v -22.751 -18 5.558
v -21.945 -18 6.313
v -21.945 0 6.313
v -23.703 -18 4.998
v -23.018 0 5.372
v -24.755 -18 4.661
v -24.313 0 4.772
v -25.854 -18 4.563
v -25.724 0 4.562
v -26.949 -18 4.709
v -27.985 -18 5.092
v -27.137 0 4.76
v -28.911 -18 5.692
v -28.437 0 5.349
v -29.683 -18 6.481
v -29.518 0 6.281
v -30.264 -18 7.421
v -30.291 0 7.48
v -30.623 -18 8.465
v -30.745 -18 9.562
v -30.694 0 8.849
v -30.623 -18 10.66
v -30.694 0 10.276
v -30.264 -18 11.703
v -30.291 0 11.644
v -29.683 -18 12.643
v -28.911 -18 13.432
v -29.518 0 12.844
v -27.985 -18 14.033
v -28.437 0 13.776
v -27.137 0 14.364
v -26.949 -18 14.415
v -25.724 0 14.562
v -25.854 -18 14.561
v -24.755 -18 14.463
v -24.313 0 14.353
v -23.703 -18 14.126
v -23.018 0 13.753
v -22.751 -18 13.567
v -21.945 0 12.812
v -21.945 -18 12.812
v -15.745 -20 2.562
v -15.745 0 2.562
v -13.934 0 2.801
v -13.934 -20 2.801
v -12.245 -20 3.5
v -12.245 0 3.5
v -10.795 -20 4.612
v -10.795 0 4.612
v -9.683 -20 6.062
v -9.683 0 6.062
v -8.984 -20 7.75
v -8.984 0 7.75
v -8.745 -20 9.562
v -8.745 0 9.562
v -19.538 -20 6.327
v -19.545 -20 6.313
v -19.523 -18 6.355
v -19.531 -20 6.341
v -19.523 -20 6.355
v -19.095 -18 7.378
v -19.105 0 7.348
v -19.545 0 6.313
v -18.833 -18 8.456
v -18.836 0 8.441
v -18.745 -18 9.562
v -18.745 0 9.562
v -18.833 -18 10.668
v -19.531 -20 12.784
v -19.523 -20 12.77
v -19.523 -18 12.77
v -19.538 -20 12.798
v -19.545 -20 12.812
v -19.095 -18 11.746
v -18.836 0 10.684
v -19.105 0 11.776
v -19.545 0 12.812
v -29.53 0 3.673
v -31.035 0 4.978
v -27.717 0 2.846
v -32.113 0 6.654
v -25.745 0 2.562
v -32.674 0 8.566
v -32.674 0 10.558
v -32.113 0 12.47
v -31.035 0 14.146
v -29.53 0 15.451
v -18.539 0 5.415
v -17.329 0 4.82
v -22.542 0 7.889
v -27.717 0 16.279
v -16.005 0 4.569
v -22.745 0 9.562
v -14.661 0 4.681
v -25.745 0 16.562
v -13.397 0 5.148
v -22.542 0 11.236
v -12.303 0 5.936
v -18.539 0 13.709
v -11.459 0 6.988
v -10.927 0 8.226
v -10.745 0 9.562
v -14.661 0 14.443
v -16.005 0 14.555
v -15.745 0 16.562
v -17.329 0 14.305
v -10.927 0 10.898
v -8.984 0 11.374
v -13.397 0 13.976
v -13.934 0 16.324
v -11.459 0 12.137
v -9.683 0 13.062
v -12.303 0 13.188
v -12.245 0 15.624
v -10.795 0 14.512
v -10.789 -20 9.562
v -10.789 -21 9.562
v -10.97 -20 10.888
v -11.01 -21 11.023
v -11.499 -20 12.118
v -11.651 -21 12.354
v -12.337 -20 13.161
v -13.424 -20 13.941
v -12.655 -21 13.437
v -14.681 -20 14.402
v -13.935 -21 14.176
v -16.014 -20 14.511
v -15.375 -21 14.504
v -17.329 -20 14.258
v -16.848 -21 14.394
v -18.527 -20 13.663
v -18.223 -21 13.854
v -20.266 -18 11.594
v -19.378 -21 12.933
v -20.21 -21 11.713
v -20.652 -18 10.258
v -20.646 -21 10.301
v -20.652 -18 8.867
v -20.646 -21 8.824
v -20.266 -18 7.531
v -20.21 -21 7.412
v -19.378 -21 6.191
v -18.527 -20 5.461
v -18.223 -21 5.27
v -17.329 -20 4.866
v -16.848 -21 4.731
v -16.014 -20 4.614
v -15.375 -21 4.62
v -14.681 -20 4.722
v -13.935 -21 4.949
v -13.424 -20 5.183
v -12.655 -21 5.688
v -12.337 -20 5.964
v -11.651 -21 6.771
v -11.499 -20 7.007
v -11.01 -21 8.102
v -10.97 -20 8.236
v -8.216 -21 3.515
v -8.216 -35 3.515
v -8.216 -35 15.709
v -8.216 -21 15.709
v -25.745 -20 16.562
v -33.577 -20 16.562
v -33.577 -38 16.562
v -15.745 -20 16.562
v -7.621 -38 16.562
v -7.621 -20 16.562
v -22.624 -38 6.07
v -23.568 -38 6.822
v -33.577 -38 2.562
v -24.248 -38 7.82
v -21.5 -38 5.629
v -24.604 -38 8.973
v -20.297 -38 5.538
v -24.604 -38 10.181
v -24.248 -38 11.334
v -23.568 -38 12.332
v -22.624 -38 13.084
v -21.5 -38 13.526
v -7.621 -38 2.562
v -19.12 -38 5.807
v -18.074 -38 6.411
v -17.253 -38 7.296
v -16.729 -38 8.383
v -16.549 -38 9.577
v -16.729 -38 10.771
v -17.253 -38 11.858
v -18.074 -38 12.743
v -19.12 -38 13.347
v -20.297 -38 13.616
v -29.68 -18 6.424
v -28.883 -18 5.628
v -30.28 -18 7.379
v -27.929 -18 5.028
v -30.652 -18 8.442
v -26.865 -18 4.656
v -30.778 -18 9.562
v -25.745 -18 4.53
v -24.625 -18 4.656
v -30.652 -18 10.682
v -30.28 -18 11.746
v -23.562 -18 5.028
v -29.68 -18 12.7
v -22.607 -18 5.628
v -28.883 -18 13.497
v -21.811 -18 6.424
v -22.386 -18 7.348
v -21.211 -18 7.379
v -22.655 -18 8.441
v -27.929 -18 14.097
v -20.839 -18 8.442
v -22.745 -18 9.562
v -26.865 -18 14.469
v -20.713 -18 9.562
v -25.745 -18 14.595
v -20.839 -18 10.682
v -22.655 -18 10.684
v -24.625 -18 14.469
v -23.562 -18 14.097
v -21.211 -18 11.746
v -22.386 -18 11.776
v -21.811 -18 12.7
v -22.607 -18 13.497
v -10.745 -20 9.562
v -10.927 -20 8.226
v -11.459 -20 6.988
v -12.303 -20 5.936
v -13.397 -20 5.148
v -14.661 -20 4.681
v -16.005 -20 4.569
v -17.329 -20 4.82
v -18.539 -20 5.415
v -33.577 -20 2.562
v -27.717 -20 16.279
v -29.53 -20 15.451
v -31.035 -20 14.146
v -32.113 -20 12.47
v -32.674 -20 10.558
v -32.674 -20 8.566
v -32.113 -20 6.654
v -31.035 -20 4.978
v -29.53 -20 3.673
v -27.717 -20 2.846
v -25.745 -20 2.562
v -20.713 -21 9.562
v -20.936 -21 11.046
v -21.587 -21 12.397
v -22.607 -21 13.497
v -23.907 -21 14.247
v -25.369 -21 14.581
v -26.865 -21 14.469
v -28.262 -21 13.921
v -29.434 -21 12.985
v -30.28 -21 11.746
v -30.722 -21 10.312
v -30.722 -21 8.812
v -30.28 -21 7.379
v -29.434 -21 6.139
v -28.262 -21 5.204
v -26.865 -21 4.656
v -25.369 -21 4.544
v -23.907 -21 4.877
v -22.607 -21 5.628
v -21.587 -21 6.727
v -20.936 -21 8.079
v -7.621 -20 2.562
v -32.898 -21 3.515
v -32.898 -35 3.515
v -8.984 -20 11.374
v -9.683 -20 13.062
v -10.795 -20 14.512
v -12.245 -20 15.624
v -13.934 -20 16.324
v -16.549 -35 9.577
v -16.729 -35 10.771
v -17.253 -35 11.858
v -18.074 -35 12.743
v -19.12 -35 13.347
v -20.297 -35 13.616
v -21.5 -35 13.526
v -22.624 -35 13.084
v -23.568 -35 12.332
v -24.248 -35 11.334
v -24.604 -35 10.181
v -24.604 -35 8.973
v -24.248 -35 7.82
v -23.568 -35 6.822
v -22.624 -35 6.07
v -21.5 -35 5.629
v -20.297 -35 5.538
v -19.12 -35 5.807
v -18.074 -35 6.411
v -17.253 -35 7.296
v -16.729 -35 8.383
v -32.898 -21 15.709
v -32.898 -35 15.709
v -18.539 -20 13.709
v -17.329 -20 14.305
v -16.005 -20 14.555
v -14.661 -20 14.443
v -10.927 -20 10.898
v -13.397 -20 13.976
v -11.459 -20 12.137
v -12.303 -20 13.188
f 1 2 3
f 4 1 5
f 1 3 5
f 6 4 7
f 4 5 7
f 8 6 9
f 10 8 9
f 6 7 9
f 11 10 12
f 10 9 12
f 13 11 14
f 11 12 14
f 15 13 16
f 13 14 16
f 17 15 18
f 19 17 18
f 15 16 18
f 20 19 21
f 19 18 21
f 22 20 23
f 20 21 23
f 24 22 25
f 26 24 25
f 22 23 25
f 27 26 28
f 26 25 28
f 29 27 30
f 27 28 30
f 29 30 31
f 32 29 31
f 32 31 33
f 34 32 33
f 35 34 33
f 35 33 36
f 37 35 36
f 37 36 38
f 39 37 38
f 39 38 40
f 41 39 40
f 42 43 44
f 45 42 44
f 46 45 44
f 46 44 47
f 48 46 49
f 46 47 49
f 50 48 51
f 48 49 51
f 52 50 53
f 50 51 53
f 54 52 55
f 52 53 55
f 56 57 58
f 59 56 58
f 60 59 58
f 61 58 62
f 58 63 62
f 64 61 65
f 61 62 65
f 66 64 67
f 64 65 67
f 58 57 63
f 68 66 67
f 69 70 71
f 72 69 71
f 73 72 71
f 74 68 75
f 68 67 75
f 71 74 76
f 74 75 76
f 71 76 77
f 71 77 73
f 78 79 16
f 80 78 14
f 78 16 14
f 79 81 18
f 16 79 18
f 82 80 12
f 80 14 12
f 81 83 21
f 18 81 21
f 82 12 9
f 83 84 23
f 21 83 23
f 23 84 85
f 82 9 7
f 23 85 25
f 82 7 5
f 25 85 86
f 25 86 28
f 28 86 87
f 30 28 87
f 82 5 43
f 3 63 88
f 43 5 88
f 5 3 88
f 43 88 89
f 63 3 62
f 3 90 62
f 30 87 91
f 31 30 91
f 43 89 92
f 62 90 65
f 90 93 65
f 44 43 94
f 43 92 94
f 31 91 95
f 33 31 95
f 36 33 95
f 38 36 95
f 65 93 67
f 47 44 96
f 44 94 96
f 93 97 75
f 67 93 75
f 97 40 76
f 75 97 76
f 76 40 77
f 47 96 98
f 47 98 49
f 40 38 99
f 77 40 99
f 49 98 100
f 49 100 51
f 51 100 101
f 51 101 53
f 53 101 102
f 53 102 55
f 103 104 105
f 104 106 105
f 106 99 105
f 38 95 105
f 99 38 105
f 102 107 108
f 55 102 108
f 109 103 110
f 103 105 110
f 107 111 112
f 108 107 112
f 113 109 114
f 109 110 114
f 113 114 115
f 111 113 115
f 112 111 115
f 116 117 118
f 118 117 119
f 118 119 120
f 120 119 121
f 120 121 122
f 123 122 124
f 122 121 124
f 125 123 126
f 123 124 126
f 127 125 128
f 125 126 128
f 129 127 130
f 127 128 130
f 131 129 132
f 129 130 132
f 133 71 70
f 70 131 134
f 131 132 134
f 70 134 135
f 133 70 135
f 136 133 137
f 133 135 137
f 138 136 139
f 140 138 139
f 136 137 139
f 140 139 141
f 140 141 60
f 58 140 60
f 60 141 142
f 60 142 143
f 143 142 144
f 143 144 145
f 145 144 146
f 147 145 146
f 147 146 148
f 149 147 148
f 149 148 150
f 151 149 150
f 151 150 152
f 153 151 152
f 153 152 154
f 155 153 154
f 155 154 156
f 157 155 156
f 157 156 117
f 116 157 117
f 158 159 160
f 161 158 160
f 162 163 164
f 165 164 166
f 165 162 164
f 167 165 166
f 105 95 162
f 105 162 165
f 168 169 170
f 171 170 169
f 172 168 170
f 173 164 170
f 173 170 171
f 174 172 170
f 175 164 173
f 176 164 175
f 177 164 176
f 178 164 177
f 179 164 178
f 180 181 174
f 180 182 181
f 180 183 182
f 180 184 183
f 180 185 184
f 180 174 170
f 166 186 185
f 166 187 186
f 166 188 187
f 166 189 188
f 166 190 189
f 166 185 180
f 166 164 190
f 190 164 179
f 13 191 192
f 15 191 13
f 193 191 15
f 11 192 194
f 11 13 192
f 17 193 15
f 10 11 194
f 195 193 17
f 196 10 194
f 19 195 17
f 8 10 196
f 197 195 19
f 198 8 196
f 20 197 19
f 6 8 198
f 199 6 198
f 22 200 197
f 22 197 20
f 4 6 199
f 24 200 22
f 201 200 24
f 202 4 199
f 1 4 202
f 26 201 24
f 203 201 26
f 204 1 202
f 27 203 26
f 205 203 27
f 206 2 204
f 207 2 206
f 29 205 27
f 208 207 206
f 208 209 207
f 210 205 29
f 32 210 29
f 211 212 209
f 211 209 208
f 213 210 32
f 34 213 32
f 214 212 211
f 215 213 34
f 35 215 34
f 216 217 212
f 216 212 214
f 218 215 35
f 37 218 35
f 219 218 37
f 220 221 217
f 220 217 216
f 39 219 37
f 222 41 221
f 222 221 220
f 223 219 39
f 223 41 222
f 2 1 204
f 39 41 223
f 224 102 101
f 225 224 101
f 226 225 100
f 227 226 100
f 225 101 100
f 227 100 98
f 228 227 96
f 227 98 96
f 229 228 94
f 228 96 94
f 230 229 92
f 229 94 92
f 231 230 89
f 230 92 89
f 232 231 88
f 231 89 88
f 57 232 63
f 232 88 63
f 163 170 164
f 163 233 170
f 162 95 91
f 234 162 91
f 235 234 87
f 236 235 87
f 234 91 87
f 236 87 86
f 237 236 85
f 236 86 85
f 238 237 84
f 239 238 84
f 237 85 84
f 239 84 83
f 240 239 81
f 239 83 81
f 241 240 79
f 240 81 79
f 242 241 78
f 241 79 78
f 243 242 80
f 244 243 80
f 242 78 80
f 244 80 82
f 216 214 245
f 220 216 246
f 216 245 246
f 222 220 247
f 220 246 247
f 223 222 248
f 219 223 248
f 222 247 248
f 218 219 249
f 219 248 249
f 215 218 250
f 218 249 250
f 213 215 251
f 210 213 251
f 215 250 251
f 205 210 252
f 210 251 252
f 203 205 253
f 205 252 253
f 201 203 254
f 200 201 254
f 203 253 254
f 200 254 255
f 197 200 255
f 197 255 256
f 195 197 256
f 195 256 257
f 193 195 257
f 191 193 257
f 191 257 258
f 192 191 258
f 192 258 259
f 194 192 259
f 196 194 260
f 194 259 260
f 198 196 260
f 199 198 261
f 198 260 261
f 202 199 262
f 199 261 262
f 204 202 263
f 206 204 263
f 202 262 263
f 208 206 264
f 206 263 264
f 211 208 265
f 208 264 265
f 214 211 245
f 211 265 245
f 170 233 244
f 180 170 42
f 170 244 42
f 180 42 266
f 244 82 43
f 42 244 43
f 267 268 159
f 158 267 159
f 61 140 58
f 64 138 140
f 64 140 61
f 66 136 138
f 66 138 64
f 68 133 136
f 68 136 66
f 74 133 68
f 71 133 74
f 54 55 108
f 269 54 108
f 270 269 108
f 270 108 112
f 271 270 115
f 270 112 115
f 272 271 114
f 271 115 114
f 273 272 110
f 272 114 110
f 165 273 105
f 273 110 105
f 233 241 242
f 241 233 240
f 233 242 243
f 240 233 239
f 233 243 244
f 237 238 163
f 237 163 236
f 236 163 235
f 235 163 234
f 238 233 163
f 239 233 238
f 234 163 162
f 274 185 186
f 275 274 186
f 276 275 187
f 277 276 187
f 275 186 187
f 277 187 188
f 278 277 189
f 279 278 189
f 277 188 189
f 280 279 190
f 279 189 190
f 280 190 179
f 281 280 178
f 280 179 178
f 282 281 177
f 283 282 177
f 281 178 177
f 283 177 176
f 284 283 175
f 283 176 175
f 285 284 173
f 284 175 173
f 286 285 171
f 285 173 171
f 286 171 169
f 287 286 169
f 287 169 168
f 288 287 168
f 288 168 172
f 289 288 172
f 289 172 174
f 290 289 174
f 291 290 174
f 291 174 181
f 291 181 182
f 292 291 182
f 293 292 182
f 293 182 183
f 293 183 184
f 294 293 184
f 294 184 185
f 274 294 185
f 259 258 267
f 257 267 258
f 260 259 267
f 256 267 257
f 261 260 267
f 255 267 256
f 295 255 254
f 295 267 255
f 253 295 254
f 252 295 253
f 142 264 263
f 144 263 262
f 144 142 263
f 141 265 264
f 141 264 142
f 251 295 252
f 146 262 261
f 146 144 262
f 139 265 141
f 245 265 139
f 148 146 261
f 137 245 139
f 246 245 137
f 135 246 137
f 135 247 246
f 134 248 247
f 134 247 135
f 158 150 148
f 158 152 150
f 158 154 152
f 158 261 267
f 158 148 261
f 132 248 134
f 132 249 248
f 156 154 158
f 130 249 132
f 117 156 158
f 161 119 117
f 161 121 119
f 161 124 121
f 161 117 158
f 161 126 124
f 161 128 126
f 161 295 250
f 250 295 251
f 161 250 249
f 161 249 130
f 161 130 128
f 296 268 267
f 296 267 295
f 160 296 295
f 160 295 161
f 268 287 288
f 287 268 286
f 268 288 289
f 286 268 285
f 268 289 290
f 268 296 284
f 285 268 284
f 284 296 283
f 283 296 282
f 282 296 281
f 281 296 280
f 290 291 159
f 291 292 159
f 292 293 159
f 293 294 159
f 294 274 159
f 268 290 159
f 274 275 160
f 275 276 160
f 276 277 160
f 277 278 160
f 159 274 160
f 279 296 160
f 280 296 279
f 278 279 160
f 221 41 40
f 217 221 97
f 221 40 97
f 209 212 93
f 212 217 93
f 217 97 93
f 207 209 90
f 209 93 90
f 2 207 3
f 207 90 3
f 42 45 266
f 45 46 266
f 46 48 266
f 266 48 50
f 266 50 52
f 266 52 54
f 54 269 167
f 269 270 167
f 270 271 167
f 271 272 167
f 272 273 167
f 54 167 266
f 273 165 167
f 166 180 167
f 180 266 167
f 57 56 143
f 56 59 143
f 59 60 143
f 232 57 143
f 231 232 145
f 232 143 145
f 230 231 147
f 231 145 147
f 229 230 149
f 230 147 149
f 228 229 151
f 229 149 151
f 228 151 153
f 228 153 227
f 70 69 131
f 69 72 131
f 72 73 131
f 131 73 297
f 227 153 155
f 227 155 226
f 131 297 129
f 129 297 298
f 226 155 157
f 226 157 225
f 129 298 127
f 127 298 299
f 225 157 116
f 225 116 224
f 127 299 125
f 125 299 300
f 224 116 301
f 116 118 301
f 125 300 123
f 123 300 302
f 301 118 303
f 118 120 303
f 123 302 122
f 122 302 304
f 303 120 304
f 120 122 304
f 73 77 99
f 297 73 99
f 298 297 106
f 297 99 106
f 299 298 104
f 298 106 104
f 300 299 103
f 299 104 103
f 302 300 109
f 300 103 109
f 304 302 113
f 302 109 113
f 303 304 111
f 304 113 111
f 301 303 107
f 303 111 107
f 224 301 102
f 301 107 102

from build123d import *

# Parameters (mm, degrees)
F1_DEPTH  = 13
F2_R      = 6.8523627272
F3_DEPTH  = 30
F4_DEPTH  = 20
F5_W      = 25.9563405998
F5_H      = 14
F6_DEPTH  = 15
F7_W      = 24.6814545244
F7_H      = 12.1941640973
F8_DEPTH  = 14
F9_R      = 5.0327145122
F9_R_2    = 4.9558235457
F10_DEPTH = 3
F11_W     = 25.9563405998
F11_H     = 14
F12_DEPTH = 3
F13_R     = 4.05
F14_DEPTH = 5


with BuildPart() as f1:
    # F0 (on Front) → F1 (new body)
    with BuildSketch(Plane.XZ):
        with BuildLine():
            ThreePointArc((-21.9452433995, 6.3125732282), (-30.7452433995, 9.5621885901), (-21.9452433995, 12.8118039519))
            ThreePointArc((-21.9452433995, 12.8118039519), (-21.4056409565, 13.6804284443), (-20.7452433995, 14.4611680756))
            ThreePointArc((-20.7452433995, 14.4611680756), (-23.0334963979, 16.0155929784), (-25.7452433995, 16.5621885901))
            ThreePointArc((-25.7452433995, 16.5621885901), (-32.7452433995, 9.5621885901), (-25.7452433995, 2.5621885901))
            ThreePointArc((-25.7452433995, 2.5621885901), (-23.0334963979, 3.1087842017), (-20.7452433995, 4.6632091045))
            ThreePointArc((-20.7452433995, 4.6632091045), (-21.4056409565, 5.4439487359), (-21.9452433995, 6.3125732282))
        make_face()
        with BuildLine():
            ThreePointArc((-20.7452433995, 14.4611680756), (-20.0848458425, 13.6804284443), (-19.5452433995, 12.8118039519))
            ThreePointArc((-19.5452433995, 12.8118039519), (-14.0131925919, 14.2526043499), (-10.7452433995, 9.5621885901))
            ThreePointArc((-10.7452433995, 9.5621885901), (-14.0131925919, 4.8717728303), (-19.5452433995, 6.3125732282))
            ThreePointArc((-19.5452433995, 6.3125732282), (-20.0848458425, 5.4439487359), (-20.7452433995, 4.6632091045))
            ThreePointArc((-20.7452433995, 4.6632091045), (-18.4569904011, 3.1087842017), (-15.7452433995, 2.5621885901))
            ThreePointArc((-15.7452433995, 2.5621885901), (-10.7954959312, 4.6124411218), (-8.7452433995, 9.5621885901))
            ThreePointArc((-8.7452433995, 9.5621885901), (-10.7954959312, 14.5119360584), (-15.7452433995, 16.5621885901))
            ThreePointArc((-15.7452433995, 16.5621885901), (-18.4569904011, 16.0155929784), (-20.7452433995, 14.4611680756))
        make_face()
        with BuildLine():
            ThreePointArc((-25.7452433995, 16.5621885901), (-23.0334963979, 16.0155929784), (-20.7452433995, 14.4611680756))
            ThreePointArc((-20.7452433995, 14.4611680756), (-18.4569904011, 16.0155929784), (-15.7452433995, 16.5621885901))
            Line((-15.7452433995, 16.5621885901), (-25.7452433995, 16.5621885901))
        make_face()
        with BuildLine():
            ThreePointArc((-15.7452433995, 2.5621885901), (-18.4569904011, 3.1087842017), (-20.7452433995, 4.6632091045))
            ThreePointArc((-20.7452433995, 4.6632091045), (-23.0334963979, 3.1087842017), (-25.7452433995, 2.5621885901))
            Line((-25.7452433995, 2.5621885901), (-15.7452433995, 2.5621885901))
        make_face()
    extrude(amount=F1_DEPTH)

    # F2 (on face) → F3 (cut)
    with BuildSketch(Plane.XZ.offset(13)):
        with Locations((-20.7452433995, 9.5621885901)):
            Circle(F2_R)
    extrude(amount=-F3_DEPTH, mode=Mode.SUBTRACT)

    # F0 (on Front) → F4 (join)
    with BuildSketch(Plane.XZ):
        with BuildLine():
            ThreePointArc((-21.9452433995, 6.3125732282), (-21.0548276397, 7.8301377825), (-20.7452433995, 9.5621885901))
            ThreePointArc((-20.7452433995, 9.5621885901), (-21.0548276397, 11.2942393976), (-21.9452433995, 12.8118039519))
            ThreePointArc((-21.9452433995, 12.8118039519), (-22.7452433995, 9.5621885901), (-21.9452433995, 6.3125732282))
        make_face()
        with BuildLine():
            ThreePointArc((-19.5452433995, 6.3125732282), (-20.4356591593, 7.8301377825), (-20.7452433995, 9.5621885901))
            ThreePointArc((-20.7452433995, 9.5621885901), (-21.0548276397, 7.8301377825), (-21.9452433995, 6.3125732282))
            ThreePointArc((-21.9452433995, 6.3125732282), (-21.4056409565, 5.4439487359), (-20.7452433995, 4.6632091045))
            ThreePointArc((-20.7452433995, 4.6632091045), (-20.0848458425, 5.4439487359), (-19.5452433995, 6.3125732282))
        make_face()
        with BuildLine():
            ThreePointArc((-21.9452433995, 12.8118039519), (-21.0548276397, 11.2942393976), (-20.7452433995, 9.5621885901))
            ThreePointArc((-20.7452433995, 9.5621885901), (-20.4356591593, 11.2942393976), (-19.5452433995, 12.8118039519))
            ThreePointArc((-19.5452433995, 12.8118039519), (-20.0848458425, 13.6804284443), (-20.7452433995, 14.4611680756))
            ThreePointArc((-20.7452433995, 14.4611680756), (-21.4056409565, 13.6804284443), (-21.9452433995, 12.8118039519))
        make_face()
        with BuildLine():
            ThreePointArc((-19.5452433995, 12.8118039519), (-20.4356591593, 11.2942393976), (-20.7452433995, 9.5621885901))
            ThreePointArc((-20.7452433995, 9.5621885901), (-20.4356591593, 7.8301377825), (-19.5452433995, 6.3125732282))
            ThreePointArc((-19.5452433995, 6.3125732282), (-18.9481852123, 7.888868537), (-18.7452433995, 9.5621885901))
            ThreePointArc((-18.7452433995, 9.5621885901), (-18.9481852123, 11.2355086431), (-19.5452433995, 12.8118039519))
        make_face()
        with BuildLine():
            ThreePointArc((-21.9452433995, 6.3125732282), (-30.7452433995, 9.5621885901), (-21.9452433995, 12.8118039519))
            ThreePointArc((-21.9452433995, 12.8118039519), (-21.4056409565, 13.6804284443), (-20.7452433995, 14.4611680756))
            ThreePointArc((-20.7452433995, 14.4611680756), (-23.0334963979, 16.0155929784), (-25.7452433995, 16.5621885901))
            ThreePointArc((-25.7452433995, 16.5621885901), (-32.7452433995, 9.5621885901), (-25.7452433995, 2.5621885901))
            ThreePointArc((-25.7452433995, 2.5621885901), (-23.0334963979, 3.1087842017), (-20.7452433995, 4.6632091045))
            ThreePointArc((-20.7452433995, 4.6632091045), (-21.4056409565, 5.4439487359), (-21.9452433995, 6.3125732282))
        make_face()
        with BuildLine():
            ThreePointArc((-20.7452433995, 14.4611680756), (-20.0848458425, 13.6804284443), (-19.5452433995, 12.8118039519))
            ThreePointArc((-19.5452433995, 12.8118039519), (-14.0131925919, 14.2526043499), (-10.7452433995, 9.5621885901))
            ThreePointArc((-10.7452433995, 9.5621885901), (-14.0131925919, 4.8717728303), (-19.5452433995, 6.3125732282))
            ThreePointArc((-19.5452433995, 6.3125732282), (-20.0848458425, 5.4439487359), (-20.7452433995, 4.6632091045))
            ThreePointArc((-20.7452433995, 4.6632091045), (-18.4569904011, 3.1087842017), (-15.7452433995, 2.5621885901))
            ThreePointArc((-15.7452433995, 2.5621885901), (-10.7954959312, 4.6124411218), (-8.7452433995, 9.5621885901))
            ThreePointArc((-8.7452433995, 9.5621885901), (-10.7954959312, 14.5119360584), (-15.7452433995, 16.5621885901))
            ThreePointArc((-15.7452433995, 16.5621885901), (-18.4569904011, 16.0155929784), (-20.7452433995, 14.4611680756))
        make_face()
        with BuildLine():
            ThreePointArc((-25.7452433995, 16.5621885901), (-23.0334963979, 16.0155929784), (-20.7452433995, 14.4611680756))
            ThreePointArc((-20.7452433995, 14.4611680756), (-18.4569904011, 16.0155929784), (-15.7452433995, 16.5621885901))
            Line((-15.7452433995, 16.5621885901), (-25.7452433995, 16.5621885901))
        make_face()
        with BuildLine():
            ThreePointArc((-15.7452433995, 2.5621885901), (-18.4569904011, 3.1087842017), (-20.7452433995, 4.6632091045))
            ThreePointArc((-20.7452433995, 4.6632091045), (-23.0334963979, 3.1087842017), (-25.7452433995, 2.5621885901))
            Line((-25.7452433995, 2.5621885901), (-15.7452433995, 2.5621885901))
        make_face()
    extrude(amount=F4_DEPTH)

    # F5 (on face) → F6 (join)
    with BuildSketch(Plane.XZ.offset(20)):
        with Locations((-20.5991824623, 9.5621885901)):
            Rectangle(F5_W, F5_H)
    extrude(amount=F6_DEPTH)

    # F7 (on face) → F8 (cut)
    with BuildSketch(Plane.XZ.offset(35)):
        with Locations((-20.5570058897, 9.6122492105)):
            Rectangle(F7_W, F7_H)
    extrude(amount=-F8_DEPTH, mode=Mode.SUBTRACT)

    # F9 (on face) → F10 (cut)
    with BuildSketch(Plane.XZ.offset(21)):
        with Locations((-25.7452465594, 9.5622381195)):
            Circle(F9_R)
        with Locations((-15.7452113926, 9.5622753724)):
            Circle(F9_R_2)
    extrude(amount=-F10_DEPTH, mode=Mode.SUBTRACT)

    # F11 (on face) → F12 (join)
    with BuildSketch(Plane.XZ.offset(35)):
        with Locations((-20.5991824623, 9.5621885901)):
            Rectangle(F11_W, F11_H)
    extrude(amount=F12_DEPTH)

    # F13 (on face) → F14 (cut)
    with BuildSketch(Plane.XZ.offset(38)):
        with Locations((-20.5991824623, 9.5770442858)):
            Circle(F13_R)
    extrude(amount=-F14_DEPTH, mode=Mode.SUBTRACT)


solid = f1.part
